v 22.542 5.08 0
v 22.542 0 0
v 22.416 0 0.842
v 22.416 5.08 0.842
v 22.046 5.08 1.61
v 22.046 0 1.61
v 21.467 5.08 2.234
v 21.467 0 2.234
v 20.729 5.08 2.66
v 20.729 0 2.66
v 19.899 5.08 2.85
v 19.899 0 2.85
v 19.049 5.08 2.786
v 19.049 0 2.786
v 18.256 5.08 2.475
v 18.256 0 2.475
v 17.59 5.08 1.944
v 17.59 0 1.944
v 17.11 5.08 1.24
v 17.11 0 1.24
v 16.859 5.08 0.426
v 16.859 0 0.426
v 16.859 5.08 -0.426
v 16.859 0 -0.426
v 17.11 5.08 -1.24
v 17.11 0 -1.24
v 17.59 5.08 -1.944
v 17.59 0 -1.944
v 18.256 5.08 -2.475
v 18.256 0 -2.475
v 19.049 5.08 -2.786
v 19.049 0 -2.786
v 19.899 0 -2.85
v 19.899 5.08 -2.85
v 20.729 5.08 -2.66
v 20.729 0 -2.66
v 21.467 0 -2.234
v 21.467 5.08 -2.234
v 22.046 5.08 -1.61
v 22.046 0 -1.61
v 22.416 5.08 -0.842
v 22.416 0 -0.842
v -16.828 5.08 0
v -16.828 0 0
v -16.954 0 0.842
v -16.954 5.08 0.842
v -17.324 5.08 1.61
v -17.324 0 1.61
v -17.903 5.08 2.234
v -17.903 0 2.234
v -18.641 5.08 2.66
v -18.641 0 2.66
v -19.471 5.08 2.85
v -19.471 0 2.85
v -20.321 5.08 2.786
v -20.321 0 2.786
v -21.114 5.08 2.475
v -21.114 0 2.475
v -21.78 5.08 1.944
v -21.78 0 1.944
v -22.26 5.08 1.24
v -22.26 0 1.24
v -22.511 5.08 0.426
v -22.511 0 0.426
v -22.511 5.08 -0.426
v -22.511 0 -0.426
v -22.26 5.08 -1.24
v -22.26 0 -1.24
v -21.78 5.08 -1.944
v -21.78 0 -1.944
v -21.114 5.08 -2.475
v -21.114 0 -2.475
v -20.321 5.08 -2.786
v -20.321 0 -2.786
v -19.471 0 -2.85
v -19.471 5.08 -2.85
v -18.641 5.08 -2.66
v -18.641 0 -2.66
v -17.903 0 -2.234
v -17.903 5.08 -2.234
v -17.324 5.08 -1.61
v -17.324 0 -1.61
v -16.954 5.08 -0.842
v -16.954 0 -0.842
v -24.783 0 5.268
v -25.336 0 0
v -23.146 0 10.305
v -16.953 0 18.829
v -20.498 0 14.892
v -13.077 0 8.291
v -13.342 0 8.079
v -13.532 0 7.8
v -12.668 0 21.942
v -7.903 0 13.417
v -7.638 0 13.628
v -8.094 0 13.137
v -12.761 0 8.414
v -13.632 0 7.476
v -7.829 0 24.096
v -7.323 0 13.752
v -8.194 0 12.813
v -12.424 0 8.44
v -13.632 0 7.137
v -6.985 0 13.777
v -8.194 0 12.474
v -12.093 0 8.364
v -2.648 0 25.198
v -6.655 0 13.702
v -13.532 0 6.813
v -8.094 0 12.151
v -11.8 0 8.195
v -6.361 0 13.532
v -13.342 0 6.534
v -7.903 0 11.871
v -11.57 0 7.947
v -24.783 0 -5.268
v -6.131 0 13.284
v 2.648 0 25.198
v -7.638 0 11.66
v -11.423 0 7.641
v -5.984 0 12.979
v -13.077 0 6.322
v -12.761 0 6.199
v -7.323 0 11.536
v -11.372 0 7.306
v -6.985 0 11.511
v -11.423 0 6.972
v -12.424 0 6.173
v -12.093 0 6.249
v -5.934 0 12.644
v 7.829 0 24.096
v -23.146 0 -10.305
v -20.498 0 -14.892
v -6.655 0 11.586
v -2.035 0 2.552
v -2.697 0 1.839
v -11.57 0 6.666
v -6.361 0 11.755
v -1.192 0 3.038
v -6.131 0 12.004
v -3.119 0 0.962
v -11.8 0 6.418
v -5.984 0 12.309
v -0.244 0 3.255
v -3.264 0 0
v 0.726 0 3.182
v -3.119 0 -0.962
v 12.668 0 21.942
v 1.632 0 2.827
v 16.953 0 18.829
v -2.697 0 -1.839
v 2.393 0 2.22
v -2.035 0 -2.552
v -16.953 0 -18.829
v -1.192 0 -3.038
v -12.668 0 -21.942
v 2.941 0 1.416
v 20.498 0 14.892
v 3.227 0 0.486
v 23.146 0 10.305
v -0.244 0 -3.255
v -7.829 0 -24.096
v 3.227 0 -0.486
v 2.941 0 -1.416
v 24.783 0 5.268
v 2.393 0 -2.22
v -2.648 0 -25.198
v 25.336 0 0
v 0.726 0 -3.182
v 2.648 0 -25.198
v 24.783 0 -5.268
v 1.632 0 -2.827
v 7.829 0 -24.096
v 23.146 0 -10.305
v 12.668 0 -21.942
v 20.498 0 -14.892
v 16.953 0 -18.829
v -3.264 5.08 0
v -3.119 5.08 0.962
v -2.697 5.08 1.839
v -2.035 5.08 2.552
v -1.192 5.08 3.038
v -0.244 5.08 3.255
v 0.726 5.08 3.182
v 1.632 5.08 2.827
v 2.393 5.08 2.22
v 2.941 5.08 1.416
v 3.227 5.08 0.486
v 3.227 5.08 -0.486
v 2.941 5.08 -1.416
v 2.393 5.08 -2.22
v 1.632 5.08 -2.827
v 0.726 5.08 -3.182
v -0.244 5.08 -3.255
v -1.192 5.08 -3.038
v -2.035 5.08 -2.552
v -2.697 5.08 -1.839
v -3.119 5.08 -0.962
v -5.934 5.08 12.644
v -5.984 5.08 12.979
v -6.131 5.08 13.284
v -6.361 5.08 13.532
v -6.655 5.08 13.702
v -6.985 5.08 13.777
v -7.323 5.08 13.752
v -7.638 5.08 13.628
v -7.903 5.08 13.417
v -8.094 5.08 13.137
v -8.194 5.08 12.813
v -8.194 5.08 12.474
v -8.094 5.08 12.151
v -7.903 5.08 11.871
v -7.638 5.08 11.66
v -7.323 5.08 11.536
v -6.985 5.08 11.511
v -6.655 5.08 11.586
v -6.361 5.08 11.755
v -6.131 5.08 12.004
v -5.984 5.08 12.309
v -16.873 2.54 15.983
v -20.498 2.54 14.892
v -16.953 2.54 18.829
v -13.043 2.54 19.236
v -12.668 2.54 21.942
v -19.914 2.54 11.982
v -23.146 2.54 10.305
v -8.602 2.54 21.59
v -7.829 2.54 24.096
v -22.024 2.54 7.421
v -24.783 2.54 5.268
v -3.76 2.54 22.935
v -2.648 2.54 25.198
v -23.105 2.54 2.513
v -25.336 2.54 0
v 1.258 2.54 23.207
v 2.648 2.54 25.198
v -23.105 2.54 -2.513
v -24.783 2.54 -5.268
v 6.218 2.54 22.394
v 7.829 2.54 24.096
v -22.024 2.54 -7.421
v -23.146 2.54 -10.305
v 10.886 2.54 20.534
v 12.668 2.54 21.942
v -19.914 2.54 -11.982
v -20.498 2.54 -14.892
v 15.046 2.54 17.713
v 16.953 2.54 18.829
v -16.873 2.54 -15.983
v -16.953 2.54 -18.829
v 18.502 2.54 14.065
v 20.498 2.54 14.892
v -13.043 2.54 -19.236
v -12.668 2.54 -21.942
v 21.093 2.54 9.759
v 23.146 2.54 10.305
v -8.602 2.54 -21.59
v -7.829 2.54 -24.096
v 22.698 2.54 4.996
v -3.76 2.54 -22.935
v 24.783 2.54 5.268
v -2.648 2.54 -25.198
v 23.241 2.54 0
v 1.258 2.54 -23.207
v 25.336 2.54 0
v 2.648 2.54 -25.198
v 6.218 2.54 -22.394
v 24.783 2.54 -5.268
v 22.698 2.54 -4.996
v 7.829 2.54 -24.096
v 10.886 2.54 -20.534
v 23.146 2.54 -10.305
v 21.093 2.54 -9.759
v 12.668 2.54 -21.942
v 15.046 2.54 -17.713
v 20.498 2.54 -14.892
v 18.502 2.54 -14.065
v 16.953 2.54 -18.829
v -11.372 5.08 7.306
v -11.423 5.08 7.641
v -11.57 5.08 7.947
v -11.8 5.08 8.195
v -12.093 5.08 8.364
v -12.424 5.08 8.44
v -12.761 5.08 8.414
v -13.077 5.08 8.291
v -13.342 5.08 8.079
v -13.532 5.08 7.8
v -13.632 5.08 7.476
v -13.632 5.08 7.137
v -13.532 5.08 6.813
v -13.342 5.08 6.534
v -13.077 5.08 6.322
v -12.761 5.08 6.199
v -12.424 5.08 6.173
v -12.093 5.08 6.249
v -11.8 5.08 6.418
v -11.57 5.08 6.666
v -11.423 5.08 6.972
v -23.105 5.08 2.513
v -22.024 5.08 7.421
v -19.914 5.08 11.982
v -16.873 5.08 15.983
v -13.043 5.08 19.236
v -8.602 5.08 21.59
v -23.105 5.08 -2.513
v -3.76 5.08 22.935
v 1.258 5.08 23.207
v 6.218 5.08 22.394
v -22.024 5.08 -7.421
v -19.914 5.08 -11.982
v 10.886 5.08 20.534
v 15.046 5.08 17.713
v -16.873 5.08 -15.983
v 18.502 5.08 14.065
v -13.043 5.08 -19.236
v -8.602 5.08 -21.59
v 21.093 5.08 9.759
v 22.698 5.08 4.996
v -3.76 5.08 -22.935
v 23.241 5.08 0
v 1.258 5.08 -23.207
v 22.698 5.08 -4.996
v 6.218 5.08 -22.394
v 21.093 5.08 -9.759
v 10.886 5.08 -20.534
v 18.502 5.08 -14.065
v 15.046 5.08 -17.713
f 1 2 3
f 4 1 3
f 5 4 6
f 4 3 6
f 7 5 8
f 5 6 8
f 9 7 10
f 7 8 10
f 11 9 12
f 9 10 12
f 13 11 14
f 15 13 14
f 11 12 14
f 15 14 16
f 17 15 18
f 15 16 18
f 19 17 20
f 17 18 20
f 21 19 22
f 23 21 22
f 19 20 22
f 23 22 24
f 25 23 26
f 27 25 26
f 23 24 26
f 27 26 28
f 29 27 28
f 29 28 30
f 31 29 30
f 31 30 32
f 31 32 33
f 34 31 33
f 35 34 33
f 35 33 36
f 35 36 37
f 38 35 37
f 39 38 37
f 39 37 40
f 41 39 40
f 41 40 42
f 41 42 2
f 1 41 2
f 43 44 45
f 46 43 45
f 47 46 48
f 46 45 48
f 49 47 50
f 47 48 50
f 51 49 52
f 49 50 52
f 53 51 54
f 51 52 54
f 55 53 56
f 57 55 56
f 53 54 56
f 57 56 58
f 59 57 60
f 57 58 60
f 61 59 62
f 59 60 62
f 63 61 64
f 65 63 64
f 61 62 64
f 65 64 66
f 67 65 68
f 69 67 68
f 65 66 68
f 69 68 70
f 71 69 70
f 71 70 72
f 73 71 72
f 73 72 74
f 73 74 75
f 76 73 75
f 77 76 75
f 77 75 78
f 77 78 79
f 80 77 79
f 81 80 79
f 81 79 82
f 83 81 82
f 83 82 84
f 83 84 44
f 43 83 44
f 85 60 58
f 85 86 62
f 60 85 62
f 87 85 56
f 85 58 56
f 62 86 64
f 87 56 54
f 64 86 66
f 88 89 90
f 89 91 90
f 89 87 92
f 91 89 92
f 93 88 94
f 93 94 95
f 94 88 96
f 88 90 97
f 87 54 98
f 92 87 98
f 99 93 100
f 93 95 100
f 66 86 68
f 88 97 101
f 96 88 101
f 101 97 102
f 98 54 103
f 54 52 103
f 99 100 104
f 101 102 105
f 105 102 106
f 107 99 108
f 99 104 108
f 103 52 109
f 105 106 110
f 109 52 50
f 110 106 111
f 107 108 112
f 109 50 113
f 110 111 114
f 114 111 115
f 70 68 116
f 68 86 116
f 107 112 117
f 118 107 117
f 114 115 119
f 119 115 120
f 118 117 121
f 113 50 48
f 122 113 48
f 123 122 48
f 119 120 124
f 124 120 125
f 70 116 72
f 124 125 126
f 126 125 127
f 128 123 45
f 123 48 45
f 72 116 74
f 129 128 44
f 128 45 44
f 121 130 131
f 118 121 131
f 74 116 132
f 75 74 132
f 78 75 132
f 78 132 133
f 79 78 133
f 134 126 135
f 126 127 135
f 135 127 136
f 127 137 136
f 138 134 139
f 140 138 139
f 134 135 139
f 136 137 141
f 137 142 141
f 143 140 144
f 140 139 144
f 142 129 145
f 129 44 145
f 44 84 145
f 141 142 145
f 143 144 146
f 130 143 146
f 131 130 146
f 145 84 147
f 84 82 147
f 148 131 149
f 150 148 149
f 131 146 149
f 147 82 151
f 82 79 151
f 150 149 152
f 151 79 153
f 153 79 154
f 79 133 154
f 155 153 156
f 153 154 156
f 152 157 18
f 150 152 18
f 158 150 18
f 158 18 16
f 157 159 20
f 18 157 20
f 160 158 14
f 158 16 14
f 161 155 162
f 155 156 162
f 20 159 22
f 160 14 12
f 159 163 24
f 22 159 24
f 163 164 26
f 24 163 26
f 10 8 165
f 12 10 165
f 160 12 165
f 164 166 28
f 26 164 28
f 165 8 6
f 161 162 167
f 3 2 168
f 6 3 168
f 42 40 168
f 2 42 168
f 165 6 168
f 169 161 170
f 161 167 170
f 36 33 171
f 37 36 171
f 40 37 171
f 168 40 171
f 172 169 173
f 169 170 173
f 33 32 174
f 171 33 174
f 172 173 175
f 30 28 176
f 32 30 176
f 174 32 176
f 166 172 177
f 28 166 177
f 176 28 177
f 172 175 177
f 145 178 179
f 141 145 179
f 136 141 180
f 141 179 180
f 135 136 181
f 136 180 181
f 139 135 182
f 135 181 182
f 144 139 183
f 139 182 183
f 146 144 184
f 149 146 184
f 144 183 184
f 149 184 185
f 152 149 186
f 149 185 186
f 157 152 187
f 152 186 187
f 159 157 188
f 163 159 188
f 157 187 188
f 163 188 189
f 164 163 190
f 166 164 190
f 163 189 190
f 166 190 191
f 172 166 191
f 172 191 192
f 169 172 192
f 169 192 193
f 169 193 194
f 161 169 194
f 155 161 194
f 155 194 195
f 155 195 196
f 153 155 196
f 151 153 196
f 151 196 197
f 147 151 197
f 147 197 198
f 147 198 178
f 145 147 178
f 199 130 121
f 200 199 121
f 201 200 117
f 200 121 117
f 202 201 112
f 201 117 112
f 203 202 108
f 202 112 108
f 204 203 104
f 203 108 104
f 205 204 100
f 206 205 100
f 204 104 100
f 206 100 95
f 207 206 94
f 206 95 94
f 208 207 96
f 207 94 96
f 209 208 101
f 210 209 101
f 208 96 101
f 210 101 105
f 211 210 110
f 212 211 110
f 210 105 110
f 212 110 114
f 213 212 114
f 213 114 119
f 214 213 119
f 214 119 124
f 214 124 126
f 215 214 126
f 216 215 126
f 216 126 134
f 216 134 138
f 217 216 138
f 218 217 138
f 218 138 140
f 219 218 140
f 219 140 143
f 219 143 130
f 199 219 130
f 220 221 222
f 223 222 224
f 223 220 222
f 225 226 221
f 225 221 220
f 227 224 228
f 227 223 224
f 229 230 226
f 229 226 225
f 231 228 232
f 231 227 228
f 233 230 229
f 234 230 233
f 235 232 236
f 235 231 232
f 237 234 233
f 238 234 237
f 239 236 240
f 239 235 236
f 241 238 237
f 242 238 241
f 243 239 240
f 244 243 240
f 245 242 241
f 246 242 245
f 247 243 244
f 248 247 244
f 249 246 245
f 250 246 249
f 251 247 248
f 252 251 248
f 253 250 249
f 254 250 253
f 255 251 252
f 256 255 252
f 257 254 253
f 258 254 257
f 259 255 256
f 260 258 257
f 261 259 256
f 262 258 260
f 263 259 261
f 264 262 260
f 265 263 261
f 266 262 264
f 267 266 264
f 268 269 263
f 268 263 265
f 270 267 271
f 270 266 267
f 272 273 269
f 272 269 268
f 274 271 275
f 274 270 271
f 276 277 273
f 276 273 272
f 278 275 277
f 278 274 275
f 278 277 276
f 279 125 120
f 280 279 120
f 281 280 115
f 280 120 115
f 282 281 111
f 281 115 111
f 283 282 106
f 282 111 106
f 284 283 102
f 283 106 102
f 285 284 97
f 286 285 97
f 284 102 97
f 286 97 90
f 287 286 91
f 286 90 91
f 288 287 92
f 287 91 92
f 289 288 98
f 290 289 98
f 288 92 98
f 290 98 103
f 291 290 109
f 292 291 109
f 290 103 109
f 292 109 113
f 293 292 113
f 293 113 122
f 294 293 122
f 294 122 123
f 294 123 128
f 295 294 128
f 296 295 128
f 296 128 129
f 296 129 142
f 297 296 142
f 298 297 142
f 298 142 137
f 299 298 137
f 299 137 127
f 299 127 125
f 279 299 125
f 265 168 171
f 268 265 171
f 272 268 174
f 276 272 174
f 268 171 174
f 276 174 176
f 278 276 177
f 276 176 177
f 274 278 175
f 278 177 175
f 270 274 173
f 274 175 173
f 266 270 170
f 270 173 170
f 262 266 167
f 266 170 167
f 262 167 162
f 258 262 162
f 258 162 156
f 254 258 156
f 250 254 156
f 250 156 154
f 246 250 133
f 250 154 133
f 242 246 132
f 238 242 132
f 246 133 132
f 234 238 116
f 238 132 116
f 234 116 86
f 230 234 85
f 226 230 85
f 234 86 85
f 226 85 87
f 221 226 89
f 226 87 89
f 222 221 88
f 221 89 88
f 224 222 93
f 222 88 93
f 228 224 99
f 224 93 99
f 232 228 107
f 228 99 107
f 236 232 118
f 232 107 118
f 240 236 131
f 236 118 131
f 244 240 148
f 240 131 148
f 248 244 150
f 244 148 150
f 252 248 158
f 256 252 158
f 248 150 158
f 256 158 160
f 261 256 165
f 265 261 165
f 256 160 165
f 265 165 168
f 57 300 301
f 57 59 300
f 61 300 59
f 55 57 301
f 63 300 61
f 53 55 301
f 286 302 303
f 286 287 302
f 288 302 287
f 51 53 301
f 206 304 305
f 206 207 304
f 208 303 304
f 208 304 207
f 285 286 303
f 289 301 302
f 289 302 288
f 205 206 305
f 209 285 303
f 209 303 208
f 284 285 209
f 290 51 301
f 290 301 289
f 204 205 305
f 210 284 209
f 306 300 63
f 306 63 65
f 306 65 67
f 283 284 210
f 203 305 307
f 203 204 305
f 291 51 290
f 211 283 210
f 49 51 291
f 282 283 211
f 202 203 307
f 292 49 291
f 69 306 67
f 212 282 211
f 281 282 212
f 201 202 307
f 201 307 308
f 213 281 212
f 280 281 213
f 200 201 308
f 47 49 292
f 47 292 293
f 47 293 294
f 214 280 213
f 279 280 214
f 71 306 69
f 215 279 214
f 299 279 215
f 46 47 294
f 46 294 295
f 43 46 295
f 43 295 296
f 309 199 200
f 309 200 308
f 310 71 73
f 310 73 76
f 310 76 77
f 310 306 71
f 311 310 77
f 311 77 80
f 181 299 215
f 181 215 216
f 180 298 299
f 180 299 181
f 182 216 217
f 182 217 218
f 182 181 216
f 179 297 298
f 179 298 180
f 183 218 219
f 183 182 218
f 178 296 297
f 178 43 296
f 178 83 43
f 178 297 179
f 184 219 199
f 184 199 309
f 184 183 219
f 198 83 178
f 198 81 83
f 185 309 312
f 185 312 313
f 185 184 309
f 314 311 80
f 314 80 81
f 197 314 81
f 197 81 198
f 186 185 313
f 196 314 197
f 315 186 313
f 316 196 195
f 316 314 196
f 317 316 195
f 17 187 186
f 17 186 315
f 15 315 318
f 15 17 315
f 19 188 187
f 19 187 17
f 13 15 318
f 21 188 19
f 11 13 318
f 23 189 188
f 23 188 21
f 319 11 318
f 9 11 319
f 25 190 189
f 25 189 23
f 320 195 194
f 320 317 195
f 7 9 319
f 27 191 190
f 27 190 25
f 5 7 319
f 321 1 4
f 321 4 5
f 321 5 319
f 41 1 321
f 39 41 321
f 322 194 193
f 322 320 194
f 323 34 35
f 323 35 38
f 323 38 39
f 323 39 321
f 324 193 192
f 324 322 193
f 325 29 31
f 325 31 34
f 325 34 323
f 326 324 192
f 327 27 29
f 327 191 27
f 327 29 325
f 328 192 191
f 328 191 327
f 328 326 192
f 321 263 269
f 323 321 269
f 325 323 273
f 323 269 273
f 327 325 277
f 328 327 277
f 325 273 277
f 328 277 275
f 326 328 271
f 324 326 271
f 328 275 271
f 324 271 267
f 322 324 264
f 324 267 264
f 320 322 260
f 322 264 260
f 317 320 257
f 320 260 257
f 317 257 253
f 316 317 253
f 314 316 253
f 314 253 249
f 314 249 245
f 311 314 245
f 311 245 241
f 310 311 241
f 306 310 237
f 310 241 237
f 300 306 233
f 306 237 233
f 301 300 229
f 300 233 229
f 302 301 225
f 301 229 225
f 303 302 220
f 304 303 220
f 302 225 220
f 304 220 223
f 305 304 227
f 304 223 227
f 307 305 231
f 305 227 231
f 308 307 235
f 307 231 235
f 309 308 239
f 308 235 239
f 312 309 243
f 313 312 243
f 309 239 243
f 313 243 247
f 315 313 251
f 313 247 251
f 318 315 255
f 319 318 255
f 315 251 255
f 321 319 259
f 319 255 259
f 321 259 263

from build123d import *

# Parameters (mm, degrees)
SKETCH1_R                   = 25.3365
BOSS_EXTRUDE1_DEPTH         = 2.54
SKETCH2_R                   = 23.241
BOSS_EXTRUDE2_DEPTH         = 2.54
F_1_4_CLEARANCE_HOLE1_D     = 6.5278
F_1_4_CLEARANCE_HOLE1_DEPTH = 5.08
CUT_EXTRUDE1_REACH          = 7.08
SKETCH5_R                   = 2.8575
CUT_EXTRUDE2_REACH          = 7.08
SKETCH6_R                   = 1.136382046


with BuildPart() as part:
    # Sketch1 → Boss-Extrude1 (new body)
    with BuildSketch(Plane(origin=(0, 0, 0), x_dir=(1, 0, 0), z_dir=(0, 1, 0))):
        Circle(SKETCH1_R)
    extrude(amount=BOSS_EXTRUDE1_DEPTH)

    # Sketch2 → Boss-Extrude2 (add)
    with BuildSketch(Plane(origin=(0, 2.54, 0), x_dir=(1, 0, 0), z_dir=(0, 1, 0))):
        Circle(SKETCH2_R)
    extrude(amount=BOSS_EXTRUDE2_DEPTH)

    # 1/4 Clearance Hole1
    with Locations(Plane.XZ):
        with Locations((0, 0)):
            Hole(F_1_4_CLEARANCE_HOLE1_D / 2, depth=F_1_4_CLEARANCE_HOLE1_DEPTH)

    # Sketch5 → Cut-Extrude1 (cut, up to next)
    with BuildSketch(Plane.XZ, mode=Mode.PRIVATE) as cut_extrude1_sk1:
        with Locations((-19.685, 0)):
            Circle(SKETCH5_R)
    cut_extrude1_tool1 = extrude(cut_extrude1_sk1.sketch, amount=-CUT_EXTRUDE1_REACH, mode=Mode.PRIVATE) & part.part
    add(cut_extrude1_tool1.solids().sort_by_distance((-19.685, 0, 0))[0], mode=Mode.SUBTRACT)
    # Sketch5 → Cut-Extrude1 (cut, up to next)
    with BuildSketch(Plane.XZ, mode=Mode.PRIVATE) as cut_extrude1_sk2:
        with Locations((19.685, 0)):
            Circle(SKETCH5_R)
    cut_extrude1_tool2 = extrude(cut_extrude1_sk2.sketch, amount=-CUT_EXTRUDE1_REACH, mode=Mode.PRIVATE) & part.part
    add(cut_extrude1_tool2.solids().sort_by_distance((19.685, 0, 0))[0], mode=Mode.SUBTRACT)

    # Sketch6 → Cut-Extrude2 (cut, up to next)
    with BuildSketch(Plane.XZ, mode=Mode.PRIVATE) as cut_extrude2_sk1:
        with Locations((-7.069885154, 12.643721498)):
            Circle(SKETCH6_R)
    cut_extrude2_tool1 = extrude(cut_extrude2_sk1.sketch, amount=-CUT_EXTRUDE2_REACH, mode=Mode.PRIVATE) & part.part
    add(cut_extrude2_tool1.solids().sort_by_distance((-7.069885, 0, 12.643721))[0], mode=Mode.SUBTRACT)
    # Sketch6 → Cut-Extrude2 (cut, up to next)
    with BuildSketch(Plane.XZ, mode=Mode.PRIVATE) as cut_extrude2_sk2:
        with Locations((-12.50848412, 7.306489885)):
            Circle(SKETCH6_R)
    cut_extrude2_tool2 = extrude(cut_extrude2_sk2.sketch, amount=-CUT_EXTRUDE2_REACH, mode=Mode.PRIVATE) & part.part
    add(cut_extrude2_tool2.solids().sort_by_distance((-12.508484, 0, 7.30649))[0], mode=Mode.SUBTRACT)


solid = part.part
